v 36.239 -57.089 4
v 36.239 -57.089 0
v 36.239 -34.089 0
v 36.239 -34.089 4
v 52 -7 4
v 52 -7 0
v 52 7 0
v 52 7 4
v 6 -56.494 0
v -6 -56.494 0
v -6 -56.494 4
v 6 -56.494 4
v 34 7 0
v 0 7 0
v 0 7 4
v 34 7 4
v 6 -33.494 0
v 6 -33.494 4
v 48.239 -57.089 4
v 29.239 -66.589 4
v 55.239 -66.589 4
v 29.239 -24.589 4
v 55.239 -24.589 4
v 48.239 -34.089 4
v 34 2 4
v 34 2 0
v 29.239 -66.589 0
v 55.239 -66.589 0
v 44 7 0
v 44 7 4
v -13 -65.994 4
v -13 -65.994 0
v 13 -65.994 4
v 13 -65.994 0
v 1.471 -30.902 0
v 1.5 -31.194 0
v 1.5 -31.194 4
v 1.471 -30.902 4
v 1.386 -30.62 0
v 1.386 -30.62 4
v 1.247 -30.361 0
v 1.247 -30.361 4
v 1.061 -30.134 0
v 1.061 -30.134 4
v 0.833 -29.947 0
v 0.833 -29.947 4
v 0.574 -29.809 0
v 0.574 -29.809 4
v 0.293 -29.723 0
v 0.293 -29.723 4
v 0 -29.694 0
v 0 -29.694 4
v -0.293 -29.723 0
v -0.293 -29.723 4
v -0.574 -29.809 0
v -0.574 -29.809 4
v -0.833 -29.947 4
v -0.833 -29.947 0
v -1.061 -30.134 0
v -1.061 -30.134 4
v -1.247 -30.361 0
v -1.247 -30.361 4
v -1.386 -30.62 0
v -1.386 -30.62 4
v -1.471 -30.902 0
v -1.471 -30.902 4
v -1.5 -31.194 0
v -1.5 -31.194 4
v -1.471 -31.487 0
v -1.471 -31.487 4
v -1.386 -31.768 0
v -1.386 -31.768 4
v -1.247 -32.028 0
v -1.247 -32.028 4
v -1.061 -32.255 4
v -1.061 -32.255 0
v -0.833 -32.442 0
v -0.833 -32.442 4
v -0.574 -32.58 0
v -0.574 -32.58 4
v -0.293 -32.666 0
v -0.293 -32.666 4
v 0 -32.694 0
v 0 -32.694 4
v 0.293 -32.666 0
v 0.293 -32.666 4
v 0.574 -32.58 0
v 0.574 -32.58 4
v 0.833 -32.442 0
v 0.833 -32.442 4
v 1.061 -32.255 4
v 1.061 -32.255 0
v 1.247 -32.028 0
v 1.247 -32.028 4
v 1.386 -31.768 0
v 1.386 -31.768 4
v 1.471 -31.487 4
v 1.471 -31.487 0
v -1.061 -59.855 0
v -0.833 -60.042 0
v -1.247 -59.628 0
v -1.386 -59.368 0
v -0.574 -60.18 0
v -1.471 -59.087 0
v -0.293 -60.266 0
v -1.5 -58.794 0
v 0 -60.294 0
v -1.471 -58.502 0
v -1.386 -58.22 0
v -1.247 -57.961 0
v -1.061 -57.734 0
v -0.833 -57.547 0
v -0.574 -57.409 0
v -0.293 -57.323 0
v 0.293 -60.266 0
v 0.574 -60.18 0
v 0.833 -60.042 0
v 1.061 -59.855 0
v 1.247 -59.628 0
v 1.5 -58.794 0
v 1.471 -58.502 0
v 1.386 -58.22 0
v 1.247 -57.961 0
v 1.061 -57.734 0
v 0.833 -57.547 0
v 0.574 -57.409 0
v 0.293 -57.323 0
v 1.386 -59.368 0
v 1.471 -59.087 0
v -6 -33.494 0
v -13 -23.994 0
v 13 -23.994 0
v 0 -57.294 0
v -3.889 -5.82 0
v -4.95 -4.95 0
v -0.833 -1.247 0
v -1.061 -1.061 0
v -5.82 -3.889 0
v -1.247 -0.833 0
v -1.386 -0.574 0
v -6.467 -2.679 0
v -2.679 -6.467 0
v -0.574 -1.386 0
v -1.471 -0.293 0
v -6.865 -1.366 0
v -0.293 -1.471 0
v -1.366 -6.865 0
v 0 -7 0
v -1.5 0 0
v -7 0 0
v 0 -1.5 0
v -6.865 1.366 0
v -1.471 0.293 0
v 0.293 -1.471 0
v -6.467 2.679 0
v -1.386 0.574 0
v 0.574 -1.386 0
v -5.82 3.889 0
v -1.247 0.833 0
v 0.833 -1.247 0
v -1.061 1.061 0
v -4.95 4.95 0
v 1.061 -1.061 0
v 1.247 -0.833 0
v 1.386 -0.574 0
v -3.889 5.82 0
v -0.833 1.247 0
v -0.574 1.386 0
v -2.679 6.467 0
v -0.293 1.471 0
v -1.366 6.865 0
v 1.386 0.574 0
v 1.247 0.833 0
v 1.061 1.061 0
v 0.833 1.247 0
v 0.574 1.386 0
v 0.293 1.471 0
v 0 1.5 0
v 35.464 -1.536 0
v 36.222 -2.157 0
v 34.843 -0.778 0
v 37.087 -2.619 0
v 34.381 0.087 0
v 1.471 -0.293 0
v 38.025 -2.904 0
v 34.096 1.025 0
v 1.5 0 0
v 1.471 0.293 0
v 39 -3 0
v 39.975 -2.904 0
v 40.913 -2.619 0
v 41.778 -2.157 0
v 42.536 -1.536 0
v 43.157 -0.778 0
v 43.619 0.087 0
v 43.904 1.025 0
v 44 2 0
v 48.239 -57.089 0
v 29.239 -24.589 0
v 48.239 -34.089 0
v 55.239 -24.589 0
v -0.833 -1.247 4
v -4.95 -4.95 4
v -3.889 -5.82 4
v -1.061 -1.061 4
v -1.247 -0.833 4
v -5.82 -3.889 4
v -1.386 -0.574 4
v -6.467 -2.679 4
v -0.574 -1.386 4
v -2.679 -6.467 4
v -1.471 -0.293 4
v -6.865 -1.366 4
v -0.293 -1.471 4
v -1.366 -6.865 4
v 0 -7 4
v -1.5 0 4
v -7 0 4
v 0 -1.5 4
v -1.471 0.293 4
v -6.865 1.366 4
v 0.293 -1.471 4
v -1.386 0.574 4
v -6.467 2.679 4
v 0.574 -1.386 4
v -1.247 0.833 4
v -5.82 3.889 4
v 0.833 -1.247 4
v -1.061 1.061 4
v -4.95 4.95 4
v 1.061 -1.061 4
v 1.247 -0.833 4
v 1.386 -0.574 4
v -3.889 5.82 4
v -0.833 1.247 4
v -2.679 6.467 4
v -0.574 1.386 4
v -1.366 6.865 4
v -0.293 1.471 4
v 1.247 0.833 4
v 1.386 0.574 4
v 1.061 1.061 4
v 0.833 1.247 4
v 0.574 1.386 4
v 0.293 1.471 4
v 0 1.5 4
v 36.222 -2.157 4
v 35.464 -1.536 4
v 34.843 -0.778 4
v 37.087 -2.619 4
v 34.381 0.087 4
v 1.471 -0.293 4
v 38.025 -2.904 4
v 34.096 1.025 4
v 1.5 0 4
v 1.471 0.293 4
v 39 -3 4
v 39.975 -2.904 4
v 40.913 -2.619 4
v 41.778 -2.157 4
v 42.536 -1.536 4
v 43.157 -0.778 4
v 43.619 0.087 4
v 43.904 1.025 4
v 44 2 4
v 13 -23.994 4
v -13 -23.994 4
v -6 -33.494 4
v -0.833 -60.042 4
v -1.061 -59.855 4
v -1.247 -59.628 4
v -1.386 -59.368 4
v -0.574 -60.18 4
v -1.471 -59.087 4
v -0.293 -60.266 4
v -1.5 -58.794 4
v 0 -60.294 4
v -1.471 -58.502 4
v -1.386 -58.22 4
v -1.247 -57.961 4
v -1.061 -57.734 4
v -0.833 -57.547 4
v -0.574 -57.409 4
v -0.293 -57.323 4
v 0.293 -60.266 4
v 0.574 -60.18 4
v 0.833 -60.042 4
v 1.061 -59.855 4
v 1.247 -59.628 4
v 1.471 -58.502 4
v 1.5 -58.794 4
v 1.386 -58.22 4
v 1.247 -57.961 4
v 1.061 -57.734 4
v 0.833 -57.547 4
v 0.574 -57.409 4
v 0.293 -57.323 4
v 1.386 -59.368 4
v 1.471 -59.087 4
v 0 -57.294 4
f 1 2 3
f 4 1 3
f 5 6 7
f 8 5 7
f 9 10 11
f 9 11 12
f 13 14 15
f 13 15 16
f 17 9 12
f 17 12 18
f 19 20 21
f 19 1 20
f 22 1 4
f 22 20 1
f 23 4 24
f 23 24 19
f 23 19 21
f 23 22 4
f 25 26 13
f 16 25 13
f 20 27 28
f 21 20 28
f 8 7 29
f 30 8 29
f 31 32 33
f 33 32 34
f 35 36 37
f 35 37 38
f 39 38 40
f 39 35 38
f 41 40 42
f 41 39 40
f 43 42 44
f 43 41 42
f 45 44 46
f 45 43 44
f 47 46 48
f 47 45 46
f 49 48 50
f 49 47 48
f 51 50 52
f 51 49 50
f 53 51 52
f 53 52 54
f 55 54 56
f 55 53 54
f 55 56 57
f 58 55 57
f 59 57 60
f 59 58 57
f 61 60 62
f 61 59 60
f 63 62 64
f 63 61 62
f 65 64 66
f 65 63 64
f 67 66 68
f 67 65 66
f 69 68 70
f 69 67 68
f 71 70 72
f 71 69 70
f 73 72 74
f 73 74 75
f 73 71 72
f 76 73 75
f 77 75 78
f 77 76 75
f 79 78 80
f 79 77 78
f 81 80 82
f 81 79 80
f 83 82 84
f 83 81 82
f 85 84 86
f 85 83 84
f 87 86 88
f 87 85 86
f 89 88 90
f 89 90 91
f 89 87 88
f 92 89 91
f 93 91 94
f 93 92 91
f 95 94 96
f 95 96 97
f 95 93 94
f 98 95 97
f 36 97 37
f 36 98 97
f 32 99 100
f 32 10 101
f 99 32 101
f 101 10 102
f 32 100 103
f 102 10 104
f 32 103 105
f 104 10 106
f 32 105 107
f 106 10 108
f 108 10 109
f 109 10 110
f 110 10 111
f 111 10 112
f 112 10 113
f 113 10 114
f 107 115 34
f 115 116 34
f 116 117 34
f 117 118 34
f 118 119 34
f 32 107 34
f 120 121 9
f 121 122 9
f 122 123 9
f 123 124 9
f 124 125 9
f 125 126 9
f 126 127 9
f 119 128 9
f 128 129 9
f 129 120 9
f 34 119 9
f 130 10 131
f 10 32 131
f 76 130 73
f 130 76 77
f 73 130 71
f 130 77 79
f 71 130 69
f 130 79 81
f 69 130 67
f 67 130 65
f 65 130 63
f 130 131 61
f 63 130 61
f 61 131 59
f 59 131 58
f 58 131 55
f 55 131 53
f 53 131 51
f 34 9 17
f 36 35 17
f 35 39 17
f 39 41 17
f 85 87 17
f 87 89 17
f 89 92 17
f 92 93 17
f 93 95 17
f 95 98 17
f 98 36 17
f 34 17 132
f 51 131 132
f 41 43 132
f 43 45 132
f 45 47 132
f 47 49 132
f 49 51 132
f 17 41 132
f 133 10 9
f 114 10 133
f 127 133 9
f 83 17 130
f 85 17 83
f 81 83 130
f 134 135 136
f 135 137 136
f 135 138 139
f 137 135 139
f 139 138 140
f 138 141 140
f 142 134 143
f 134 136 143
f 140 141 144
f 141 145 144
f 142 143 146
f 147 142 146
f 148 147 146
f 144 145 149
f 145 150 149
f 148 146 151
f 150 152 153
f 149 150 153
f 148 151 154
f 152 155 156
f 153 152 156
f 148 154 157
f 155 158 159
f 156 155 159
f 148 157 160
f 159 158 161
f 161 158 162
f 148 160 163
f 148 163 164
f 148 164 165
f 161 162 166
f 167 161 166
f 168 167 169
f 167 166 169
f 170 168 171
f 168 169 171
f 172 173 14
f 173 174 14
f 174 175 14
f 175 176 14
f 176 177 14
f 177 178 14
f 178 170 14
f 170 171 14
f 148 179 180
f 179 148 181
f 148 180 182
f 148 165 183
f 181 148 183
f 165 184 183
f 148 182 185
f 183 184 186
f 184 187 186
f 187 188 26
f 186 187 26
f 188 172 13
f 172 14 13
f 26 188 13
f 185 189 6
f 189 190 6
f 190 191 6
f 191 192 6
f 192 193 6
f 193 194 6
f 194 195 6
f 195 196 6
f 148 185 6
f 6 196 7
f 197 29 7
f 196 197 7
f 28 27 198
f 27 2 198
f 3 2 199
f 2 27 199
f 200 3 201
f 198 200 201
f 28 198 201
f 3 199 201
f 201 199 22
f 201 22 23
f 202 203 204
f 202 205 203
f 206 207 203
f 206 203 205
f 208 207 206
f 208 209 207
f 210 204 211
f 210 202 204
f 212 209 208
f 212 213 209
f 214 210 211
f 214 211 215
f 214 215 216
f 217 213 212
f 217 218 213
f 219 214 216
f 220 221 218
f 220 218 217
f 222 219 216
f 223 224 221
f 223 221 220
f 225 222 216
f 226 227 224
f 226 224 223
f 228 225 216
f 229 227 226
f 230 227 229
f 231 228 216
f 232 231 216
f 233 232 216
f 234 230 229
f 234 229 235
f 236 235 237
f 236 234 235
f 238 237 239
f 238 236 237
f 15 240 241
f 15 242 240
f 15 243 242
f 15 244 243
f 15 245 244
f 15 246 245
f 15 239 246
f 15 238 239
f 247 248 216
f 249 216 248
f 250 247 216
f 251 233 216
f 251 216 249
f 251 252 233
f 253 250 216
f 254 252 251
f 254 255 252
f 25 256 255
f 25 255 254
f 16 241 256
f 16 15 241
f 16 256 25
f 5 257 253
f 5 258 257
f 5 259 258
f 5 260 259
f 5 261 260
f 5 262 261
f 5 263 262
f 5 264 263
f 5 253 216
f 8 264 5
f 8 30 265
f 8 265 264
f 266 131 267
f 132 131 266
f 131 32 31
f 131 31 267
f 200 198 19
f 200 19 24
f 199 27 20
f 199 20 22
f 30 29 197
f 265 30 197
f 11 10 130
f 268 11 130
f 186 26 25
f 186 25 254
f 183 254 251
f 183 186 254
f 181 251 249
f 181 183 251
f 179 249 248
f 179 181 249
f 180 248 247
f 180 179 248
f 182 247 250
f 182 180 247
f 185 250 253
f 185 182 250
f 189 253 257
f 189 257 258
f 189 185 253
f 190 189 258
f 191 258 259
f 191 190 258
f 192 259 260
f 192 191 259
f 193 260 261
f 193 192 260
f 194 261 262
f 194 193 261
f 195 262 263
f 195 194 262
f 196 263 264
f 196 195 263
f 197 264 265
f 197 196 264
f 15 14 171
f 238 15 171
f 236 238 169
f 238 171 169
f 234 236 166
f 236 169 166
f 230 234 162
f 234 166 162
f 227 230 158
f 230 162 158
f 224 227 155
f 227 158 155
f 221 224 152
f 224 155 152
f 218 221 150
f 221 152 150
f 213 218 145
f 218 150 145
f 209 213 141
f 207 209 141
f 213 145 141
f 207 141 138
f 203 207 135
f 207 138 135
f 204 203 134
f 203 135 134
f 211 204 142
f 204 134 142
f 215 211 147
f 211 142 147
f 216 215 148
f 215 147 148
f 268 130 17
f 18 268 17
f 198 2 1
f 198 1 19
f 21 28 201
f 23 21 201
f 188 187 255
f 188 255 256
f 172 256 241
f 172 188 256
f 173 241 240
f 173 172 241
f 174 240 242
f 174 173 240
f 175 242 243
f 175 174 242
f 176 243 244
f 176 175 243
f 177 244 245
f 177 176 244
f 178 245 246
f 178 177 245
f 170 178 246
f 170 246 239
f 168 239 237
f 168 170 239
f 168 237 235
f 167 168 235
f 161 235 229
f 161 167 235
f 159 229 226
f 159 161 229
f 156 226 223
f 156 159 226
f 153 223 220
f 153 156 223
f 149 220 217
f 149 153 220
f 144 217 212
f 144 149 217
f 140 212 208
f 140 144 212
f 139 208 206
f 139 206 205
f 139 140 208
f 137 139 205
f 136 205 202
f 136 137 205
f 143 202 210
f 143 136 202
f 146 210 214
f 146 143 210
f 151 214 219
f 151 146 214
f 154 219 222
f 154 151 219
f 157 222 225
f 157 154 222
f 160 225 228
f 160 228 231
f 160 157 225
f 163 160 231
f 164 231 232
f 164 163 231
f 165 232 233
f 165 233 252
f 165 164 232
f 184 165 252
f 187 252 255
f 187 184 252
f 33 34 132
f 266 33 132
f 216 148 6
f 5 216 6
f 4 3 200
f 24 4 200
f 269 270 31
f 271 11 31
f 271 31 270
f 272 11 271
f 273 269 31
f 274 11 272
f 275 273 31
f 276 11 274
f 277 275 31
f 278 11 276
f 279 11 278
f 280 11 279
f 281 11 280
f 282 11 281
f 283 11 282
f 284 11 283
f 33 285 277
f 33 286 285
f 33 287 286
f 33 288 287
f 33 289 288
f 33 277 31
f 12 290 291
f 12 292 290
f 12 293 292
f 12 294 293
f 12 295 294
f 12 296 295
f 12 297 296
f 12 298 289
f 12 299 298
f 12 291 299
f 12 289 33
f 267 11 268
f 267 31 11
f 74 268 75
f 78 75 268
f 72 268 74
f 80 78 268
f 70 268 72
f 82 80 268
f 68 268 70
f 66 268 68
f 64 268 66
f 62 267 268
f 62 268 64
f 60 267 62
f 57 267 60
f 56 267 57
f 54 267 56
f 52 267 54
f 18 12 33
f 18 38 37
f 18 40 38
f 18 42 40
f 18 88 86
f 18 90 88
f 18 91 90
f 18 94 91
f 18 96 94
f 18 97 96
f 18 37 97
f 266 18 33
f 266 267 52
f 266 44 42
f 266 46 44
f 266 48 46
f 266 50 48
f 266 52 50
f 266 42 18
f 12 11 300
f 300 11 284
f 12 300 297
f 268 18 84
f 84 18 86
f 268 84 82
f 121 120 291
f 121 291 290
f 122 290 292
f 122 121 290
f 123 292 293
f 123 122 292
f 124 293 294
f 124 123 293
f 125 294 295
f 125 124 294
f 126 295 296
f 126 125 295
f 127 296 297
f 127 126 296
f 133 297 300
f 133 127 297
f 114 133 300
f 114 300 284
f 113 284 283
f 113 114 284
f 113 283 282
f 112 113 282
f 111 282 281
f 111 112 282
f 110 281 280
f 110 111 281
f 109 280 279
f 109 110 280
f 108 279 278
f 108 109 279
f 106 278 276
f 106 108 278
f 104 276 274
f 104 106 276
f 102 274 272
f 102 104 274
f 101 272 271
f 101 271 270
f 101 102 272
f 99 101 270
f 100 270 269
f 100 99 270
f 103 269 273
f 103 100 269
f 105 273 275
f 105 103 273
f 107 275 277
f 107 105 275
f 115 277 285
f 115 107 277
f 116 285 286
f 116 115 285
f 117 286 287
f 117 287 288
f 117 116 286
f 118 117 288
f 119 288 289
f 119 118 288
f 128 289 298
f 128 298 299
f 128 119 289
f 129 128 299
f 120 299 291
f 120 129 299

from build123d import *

# Parameters (mm, degrees)
SKETCH001_W   = 26
SKETCH001_H   = 42
SKETCH001_W_2 = 12
SKETCH001_H_2 = 23
PAD001_DEPTH  = 4
SKETCH003_W   = 26
SKETCH003_H   = 42
SKETCH003_R   = 1.5
SKETCH003_W_2 = 12
SKETCH003_H_2 = 23
PAD003_DEPTH  = 4
SKETCH_R      = 1.5
PAD_DEPTH     = 4


with BuildPart() as joint_down001:
    # Sketch001 → Pad001 (new body)
    with BuildSketch(Plane.XY):
        with Locations((42.239007, -45.589376)):
            Rectangle(SKETCH001_W, SKETCH001_H)
        with Locations((42.239007, -45.589376)):
            Rectangle(SKETCH001_W_2, SKETCH001_H_2, mode=Mode.SUBTRACT)
    extrude(amount=PAD001_DEPTH)


with BuildPart() as joint_up001:
    # Sketch003 → Pad003 (new body)
    with BuildSketch(Plane.XY):
        with Locations((0, -44.994375)):
            Rectangle(SKETCH003_W, SKETCH003_H)
        with Locations((0, -31.194375)):
            Circle(SKETCH003_R, mode=Mode.SUBTRACT)
        with Locations((0, -58.794375)):
            Circle(SKETCH003_R, mode=Mode.SUBTRACT)
        with Locations((0, -44.994375)):
            Rectangle(SKETCH003_W_2, SKETCH003_H_2, mode=Mode.SUBTRACT)
    extrude(amount=PAD003_DEPTH)


with BuildPart() as coxa:
    # Sketch → Pad (new body)
    with BuildSketch(Plane.XY):
        with BuildLine():
            ThreePointArc((0, 7), (-7, 0), (0, -7))
            Line((0, -7), (52, -7))
            Line((52, -7), (52, 6.999977))
            Line((52, 6.999977), (44, 6.999977))
            Line((44, 6.999977), (44, 1.999977))
            ThreePointArc((34, 2), (38.999988, -3.000023), (44, 1.999977))
            Line((34, 2), (34, 7))
            Line((0, 7), (34, 7))
        make_face()
        Circle(SKETCH_R, mode=Mode.SUBTRACT)
    extrude(amount=PAD_DEPTH)


solid = Compound([joint_down001.part, joint_up001.part, coxa.part])
